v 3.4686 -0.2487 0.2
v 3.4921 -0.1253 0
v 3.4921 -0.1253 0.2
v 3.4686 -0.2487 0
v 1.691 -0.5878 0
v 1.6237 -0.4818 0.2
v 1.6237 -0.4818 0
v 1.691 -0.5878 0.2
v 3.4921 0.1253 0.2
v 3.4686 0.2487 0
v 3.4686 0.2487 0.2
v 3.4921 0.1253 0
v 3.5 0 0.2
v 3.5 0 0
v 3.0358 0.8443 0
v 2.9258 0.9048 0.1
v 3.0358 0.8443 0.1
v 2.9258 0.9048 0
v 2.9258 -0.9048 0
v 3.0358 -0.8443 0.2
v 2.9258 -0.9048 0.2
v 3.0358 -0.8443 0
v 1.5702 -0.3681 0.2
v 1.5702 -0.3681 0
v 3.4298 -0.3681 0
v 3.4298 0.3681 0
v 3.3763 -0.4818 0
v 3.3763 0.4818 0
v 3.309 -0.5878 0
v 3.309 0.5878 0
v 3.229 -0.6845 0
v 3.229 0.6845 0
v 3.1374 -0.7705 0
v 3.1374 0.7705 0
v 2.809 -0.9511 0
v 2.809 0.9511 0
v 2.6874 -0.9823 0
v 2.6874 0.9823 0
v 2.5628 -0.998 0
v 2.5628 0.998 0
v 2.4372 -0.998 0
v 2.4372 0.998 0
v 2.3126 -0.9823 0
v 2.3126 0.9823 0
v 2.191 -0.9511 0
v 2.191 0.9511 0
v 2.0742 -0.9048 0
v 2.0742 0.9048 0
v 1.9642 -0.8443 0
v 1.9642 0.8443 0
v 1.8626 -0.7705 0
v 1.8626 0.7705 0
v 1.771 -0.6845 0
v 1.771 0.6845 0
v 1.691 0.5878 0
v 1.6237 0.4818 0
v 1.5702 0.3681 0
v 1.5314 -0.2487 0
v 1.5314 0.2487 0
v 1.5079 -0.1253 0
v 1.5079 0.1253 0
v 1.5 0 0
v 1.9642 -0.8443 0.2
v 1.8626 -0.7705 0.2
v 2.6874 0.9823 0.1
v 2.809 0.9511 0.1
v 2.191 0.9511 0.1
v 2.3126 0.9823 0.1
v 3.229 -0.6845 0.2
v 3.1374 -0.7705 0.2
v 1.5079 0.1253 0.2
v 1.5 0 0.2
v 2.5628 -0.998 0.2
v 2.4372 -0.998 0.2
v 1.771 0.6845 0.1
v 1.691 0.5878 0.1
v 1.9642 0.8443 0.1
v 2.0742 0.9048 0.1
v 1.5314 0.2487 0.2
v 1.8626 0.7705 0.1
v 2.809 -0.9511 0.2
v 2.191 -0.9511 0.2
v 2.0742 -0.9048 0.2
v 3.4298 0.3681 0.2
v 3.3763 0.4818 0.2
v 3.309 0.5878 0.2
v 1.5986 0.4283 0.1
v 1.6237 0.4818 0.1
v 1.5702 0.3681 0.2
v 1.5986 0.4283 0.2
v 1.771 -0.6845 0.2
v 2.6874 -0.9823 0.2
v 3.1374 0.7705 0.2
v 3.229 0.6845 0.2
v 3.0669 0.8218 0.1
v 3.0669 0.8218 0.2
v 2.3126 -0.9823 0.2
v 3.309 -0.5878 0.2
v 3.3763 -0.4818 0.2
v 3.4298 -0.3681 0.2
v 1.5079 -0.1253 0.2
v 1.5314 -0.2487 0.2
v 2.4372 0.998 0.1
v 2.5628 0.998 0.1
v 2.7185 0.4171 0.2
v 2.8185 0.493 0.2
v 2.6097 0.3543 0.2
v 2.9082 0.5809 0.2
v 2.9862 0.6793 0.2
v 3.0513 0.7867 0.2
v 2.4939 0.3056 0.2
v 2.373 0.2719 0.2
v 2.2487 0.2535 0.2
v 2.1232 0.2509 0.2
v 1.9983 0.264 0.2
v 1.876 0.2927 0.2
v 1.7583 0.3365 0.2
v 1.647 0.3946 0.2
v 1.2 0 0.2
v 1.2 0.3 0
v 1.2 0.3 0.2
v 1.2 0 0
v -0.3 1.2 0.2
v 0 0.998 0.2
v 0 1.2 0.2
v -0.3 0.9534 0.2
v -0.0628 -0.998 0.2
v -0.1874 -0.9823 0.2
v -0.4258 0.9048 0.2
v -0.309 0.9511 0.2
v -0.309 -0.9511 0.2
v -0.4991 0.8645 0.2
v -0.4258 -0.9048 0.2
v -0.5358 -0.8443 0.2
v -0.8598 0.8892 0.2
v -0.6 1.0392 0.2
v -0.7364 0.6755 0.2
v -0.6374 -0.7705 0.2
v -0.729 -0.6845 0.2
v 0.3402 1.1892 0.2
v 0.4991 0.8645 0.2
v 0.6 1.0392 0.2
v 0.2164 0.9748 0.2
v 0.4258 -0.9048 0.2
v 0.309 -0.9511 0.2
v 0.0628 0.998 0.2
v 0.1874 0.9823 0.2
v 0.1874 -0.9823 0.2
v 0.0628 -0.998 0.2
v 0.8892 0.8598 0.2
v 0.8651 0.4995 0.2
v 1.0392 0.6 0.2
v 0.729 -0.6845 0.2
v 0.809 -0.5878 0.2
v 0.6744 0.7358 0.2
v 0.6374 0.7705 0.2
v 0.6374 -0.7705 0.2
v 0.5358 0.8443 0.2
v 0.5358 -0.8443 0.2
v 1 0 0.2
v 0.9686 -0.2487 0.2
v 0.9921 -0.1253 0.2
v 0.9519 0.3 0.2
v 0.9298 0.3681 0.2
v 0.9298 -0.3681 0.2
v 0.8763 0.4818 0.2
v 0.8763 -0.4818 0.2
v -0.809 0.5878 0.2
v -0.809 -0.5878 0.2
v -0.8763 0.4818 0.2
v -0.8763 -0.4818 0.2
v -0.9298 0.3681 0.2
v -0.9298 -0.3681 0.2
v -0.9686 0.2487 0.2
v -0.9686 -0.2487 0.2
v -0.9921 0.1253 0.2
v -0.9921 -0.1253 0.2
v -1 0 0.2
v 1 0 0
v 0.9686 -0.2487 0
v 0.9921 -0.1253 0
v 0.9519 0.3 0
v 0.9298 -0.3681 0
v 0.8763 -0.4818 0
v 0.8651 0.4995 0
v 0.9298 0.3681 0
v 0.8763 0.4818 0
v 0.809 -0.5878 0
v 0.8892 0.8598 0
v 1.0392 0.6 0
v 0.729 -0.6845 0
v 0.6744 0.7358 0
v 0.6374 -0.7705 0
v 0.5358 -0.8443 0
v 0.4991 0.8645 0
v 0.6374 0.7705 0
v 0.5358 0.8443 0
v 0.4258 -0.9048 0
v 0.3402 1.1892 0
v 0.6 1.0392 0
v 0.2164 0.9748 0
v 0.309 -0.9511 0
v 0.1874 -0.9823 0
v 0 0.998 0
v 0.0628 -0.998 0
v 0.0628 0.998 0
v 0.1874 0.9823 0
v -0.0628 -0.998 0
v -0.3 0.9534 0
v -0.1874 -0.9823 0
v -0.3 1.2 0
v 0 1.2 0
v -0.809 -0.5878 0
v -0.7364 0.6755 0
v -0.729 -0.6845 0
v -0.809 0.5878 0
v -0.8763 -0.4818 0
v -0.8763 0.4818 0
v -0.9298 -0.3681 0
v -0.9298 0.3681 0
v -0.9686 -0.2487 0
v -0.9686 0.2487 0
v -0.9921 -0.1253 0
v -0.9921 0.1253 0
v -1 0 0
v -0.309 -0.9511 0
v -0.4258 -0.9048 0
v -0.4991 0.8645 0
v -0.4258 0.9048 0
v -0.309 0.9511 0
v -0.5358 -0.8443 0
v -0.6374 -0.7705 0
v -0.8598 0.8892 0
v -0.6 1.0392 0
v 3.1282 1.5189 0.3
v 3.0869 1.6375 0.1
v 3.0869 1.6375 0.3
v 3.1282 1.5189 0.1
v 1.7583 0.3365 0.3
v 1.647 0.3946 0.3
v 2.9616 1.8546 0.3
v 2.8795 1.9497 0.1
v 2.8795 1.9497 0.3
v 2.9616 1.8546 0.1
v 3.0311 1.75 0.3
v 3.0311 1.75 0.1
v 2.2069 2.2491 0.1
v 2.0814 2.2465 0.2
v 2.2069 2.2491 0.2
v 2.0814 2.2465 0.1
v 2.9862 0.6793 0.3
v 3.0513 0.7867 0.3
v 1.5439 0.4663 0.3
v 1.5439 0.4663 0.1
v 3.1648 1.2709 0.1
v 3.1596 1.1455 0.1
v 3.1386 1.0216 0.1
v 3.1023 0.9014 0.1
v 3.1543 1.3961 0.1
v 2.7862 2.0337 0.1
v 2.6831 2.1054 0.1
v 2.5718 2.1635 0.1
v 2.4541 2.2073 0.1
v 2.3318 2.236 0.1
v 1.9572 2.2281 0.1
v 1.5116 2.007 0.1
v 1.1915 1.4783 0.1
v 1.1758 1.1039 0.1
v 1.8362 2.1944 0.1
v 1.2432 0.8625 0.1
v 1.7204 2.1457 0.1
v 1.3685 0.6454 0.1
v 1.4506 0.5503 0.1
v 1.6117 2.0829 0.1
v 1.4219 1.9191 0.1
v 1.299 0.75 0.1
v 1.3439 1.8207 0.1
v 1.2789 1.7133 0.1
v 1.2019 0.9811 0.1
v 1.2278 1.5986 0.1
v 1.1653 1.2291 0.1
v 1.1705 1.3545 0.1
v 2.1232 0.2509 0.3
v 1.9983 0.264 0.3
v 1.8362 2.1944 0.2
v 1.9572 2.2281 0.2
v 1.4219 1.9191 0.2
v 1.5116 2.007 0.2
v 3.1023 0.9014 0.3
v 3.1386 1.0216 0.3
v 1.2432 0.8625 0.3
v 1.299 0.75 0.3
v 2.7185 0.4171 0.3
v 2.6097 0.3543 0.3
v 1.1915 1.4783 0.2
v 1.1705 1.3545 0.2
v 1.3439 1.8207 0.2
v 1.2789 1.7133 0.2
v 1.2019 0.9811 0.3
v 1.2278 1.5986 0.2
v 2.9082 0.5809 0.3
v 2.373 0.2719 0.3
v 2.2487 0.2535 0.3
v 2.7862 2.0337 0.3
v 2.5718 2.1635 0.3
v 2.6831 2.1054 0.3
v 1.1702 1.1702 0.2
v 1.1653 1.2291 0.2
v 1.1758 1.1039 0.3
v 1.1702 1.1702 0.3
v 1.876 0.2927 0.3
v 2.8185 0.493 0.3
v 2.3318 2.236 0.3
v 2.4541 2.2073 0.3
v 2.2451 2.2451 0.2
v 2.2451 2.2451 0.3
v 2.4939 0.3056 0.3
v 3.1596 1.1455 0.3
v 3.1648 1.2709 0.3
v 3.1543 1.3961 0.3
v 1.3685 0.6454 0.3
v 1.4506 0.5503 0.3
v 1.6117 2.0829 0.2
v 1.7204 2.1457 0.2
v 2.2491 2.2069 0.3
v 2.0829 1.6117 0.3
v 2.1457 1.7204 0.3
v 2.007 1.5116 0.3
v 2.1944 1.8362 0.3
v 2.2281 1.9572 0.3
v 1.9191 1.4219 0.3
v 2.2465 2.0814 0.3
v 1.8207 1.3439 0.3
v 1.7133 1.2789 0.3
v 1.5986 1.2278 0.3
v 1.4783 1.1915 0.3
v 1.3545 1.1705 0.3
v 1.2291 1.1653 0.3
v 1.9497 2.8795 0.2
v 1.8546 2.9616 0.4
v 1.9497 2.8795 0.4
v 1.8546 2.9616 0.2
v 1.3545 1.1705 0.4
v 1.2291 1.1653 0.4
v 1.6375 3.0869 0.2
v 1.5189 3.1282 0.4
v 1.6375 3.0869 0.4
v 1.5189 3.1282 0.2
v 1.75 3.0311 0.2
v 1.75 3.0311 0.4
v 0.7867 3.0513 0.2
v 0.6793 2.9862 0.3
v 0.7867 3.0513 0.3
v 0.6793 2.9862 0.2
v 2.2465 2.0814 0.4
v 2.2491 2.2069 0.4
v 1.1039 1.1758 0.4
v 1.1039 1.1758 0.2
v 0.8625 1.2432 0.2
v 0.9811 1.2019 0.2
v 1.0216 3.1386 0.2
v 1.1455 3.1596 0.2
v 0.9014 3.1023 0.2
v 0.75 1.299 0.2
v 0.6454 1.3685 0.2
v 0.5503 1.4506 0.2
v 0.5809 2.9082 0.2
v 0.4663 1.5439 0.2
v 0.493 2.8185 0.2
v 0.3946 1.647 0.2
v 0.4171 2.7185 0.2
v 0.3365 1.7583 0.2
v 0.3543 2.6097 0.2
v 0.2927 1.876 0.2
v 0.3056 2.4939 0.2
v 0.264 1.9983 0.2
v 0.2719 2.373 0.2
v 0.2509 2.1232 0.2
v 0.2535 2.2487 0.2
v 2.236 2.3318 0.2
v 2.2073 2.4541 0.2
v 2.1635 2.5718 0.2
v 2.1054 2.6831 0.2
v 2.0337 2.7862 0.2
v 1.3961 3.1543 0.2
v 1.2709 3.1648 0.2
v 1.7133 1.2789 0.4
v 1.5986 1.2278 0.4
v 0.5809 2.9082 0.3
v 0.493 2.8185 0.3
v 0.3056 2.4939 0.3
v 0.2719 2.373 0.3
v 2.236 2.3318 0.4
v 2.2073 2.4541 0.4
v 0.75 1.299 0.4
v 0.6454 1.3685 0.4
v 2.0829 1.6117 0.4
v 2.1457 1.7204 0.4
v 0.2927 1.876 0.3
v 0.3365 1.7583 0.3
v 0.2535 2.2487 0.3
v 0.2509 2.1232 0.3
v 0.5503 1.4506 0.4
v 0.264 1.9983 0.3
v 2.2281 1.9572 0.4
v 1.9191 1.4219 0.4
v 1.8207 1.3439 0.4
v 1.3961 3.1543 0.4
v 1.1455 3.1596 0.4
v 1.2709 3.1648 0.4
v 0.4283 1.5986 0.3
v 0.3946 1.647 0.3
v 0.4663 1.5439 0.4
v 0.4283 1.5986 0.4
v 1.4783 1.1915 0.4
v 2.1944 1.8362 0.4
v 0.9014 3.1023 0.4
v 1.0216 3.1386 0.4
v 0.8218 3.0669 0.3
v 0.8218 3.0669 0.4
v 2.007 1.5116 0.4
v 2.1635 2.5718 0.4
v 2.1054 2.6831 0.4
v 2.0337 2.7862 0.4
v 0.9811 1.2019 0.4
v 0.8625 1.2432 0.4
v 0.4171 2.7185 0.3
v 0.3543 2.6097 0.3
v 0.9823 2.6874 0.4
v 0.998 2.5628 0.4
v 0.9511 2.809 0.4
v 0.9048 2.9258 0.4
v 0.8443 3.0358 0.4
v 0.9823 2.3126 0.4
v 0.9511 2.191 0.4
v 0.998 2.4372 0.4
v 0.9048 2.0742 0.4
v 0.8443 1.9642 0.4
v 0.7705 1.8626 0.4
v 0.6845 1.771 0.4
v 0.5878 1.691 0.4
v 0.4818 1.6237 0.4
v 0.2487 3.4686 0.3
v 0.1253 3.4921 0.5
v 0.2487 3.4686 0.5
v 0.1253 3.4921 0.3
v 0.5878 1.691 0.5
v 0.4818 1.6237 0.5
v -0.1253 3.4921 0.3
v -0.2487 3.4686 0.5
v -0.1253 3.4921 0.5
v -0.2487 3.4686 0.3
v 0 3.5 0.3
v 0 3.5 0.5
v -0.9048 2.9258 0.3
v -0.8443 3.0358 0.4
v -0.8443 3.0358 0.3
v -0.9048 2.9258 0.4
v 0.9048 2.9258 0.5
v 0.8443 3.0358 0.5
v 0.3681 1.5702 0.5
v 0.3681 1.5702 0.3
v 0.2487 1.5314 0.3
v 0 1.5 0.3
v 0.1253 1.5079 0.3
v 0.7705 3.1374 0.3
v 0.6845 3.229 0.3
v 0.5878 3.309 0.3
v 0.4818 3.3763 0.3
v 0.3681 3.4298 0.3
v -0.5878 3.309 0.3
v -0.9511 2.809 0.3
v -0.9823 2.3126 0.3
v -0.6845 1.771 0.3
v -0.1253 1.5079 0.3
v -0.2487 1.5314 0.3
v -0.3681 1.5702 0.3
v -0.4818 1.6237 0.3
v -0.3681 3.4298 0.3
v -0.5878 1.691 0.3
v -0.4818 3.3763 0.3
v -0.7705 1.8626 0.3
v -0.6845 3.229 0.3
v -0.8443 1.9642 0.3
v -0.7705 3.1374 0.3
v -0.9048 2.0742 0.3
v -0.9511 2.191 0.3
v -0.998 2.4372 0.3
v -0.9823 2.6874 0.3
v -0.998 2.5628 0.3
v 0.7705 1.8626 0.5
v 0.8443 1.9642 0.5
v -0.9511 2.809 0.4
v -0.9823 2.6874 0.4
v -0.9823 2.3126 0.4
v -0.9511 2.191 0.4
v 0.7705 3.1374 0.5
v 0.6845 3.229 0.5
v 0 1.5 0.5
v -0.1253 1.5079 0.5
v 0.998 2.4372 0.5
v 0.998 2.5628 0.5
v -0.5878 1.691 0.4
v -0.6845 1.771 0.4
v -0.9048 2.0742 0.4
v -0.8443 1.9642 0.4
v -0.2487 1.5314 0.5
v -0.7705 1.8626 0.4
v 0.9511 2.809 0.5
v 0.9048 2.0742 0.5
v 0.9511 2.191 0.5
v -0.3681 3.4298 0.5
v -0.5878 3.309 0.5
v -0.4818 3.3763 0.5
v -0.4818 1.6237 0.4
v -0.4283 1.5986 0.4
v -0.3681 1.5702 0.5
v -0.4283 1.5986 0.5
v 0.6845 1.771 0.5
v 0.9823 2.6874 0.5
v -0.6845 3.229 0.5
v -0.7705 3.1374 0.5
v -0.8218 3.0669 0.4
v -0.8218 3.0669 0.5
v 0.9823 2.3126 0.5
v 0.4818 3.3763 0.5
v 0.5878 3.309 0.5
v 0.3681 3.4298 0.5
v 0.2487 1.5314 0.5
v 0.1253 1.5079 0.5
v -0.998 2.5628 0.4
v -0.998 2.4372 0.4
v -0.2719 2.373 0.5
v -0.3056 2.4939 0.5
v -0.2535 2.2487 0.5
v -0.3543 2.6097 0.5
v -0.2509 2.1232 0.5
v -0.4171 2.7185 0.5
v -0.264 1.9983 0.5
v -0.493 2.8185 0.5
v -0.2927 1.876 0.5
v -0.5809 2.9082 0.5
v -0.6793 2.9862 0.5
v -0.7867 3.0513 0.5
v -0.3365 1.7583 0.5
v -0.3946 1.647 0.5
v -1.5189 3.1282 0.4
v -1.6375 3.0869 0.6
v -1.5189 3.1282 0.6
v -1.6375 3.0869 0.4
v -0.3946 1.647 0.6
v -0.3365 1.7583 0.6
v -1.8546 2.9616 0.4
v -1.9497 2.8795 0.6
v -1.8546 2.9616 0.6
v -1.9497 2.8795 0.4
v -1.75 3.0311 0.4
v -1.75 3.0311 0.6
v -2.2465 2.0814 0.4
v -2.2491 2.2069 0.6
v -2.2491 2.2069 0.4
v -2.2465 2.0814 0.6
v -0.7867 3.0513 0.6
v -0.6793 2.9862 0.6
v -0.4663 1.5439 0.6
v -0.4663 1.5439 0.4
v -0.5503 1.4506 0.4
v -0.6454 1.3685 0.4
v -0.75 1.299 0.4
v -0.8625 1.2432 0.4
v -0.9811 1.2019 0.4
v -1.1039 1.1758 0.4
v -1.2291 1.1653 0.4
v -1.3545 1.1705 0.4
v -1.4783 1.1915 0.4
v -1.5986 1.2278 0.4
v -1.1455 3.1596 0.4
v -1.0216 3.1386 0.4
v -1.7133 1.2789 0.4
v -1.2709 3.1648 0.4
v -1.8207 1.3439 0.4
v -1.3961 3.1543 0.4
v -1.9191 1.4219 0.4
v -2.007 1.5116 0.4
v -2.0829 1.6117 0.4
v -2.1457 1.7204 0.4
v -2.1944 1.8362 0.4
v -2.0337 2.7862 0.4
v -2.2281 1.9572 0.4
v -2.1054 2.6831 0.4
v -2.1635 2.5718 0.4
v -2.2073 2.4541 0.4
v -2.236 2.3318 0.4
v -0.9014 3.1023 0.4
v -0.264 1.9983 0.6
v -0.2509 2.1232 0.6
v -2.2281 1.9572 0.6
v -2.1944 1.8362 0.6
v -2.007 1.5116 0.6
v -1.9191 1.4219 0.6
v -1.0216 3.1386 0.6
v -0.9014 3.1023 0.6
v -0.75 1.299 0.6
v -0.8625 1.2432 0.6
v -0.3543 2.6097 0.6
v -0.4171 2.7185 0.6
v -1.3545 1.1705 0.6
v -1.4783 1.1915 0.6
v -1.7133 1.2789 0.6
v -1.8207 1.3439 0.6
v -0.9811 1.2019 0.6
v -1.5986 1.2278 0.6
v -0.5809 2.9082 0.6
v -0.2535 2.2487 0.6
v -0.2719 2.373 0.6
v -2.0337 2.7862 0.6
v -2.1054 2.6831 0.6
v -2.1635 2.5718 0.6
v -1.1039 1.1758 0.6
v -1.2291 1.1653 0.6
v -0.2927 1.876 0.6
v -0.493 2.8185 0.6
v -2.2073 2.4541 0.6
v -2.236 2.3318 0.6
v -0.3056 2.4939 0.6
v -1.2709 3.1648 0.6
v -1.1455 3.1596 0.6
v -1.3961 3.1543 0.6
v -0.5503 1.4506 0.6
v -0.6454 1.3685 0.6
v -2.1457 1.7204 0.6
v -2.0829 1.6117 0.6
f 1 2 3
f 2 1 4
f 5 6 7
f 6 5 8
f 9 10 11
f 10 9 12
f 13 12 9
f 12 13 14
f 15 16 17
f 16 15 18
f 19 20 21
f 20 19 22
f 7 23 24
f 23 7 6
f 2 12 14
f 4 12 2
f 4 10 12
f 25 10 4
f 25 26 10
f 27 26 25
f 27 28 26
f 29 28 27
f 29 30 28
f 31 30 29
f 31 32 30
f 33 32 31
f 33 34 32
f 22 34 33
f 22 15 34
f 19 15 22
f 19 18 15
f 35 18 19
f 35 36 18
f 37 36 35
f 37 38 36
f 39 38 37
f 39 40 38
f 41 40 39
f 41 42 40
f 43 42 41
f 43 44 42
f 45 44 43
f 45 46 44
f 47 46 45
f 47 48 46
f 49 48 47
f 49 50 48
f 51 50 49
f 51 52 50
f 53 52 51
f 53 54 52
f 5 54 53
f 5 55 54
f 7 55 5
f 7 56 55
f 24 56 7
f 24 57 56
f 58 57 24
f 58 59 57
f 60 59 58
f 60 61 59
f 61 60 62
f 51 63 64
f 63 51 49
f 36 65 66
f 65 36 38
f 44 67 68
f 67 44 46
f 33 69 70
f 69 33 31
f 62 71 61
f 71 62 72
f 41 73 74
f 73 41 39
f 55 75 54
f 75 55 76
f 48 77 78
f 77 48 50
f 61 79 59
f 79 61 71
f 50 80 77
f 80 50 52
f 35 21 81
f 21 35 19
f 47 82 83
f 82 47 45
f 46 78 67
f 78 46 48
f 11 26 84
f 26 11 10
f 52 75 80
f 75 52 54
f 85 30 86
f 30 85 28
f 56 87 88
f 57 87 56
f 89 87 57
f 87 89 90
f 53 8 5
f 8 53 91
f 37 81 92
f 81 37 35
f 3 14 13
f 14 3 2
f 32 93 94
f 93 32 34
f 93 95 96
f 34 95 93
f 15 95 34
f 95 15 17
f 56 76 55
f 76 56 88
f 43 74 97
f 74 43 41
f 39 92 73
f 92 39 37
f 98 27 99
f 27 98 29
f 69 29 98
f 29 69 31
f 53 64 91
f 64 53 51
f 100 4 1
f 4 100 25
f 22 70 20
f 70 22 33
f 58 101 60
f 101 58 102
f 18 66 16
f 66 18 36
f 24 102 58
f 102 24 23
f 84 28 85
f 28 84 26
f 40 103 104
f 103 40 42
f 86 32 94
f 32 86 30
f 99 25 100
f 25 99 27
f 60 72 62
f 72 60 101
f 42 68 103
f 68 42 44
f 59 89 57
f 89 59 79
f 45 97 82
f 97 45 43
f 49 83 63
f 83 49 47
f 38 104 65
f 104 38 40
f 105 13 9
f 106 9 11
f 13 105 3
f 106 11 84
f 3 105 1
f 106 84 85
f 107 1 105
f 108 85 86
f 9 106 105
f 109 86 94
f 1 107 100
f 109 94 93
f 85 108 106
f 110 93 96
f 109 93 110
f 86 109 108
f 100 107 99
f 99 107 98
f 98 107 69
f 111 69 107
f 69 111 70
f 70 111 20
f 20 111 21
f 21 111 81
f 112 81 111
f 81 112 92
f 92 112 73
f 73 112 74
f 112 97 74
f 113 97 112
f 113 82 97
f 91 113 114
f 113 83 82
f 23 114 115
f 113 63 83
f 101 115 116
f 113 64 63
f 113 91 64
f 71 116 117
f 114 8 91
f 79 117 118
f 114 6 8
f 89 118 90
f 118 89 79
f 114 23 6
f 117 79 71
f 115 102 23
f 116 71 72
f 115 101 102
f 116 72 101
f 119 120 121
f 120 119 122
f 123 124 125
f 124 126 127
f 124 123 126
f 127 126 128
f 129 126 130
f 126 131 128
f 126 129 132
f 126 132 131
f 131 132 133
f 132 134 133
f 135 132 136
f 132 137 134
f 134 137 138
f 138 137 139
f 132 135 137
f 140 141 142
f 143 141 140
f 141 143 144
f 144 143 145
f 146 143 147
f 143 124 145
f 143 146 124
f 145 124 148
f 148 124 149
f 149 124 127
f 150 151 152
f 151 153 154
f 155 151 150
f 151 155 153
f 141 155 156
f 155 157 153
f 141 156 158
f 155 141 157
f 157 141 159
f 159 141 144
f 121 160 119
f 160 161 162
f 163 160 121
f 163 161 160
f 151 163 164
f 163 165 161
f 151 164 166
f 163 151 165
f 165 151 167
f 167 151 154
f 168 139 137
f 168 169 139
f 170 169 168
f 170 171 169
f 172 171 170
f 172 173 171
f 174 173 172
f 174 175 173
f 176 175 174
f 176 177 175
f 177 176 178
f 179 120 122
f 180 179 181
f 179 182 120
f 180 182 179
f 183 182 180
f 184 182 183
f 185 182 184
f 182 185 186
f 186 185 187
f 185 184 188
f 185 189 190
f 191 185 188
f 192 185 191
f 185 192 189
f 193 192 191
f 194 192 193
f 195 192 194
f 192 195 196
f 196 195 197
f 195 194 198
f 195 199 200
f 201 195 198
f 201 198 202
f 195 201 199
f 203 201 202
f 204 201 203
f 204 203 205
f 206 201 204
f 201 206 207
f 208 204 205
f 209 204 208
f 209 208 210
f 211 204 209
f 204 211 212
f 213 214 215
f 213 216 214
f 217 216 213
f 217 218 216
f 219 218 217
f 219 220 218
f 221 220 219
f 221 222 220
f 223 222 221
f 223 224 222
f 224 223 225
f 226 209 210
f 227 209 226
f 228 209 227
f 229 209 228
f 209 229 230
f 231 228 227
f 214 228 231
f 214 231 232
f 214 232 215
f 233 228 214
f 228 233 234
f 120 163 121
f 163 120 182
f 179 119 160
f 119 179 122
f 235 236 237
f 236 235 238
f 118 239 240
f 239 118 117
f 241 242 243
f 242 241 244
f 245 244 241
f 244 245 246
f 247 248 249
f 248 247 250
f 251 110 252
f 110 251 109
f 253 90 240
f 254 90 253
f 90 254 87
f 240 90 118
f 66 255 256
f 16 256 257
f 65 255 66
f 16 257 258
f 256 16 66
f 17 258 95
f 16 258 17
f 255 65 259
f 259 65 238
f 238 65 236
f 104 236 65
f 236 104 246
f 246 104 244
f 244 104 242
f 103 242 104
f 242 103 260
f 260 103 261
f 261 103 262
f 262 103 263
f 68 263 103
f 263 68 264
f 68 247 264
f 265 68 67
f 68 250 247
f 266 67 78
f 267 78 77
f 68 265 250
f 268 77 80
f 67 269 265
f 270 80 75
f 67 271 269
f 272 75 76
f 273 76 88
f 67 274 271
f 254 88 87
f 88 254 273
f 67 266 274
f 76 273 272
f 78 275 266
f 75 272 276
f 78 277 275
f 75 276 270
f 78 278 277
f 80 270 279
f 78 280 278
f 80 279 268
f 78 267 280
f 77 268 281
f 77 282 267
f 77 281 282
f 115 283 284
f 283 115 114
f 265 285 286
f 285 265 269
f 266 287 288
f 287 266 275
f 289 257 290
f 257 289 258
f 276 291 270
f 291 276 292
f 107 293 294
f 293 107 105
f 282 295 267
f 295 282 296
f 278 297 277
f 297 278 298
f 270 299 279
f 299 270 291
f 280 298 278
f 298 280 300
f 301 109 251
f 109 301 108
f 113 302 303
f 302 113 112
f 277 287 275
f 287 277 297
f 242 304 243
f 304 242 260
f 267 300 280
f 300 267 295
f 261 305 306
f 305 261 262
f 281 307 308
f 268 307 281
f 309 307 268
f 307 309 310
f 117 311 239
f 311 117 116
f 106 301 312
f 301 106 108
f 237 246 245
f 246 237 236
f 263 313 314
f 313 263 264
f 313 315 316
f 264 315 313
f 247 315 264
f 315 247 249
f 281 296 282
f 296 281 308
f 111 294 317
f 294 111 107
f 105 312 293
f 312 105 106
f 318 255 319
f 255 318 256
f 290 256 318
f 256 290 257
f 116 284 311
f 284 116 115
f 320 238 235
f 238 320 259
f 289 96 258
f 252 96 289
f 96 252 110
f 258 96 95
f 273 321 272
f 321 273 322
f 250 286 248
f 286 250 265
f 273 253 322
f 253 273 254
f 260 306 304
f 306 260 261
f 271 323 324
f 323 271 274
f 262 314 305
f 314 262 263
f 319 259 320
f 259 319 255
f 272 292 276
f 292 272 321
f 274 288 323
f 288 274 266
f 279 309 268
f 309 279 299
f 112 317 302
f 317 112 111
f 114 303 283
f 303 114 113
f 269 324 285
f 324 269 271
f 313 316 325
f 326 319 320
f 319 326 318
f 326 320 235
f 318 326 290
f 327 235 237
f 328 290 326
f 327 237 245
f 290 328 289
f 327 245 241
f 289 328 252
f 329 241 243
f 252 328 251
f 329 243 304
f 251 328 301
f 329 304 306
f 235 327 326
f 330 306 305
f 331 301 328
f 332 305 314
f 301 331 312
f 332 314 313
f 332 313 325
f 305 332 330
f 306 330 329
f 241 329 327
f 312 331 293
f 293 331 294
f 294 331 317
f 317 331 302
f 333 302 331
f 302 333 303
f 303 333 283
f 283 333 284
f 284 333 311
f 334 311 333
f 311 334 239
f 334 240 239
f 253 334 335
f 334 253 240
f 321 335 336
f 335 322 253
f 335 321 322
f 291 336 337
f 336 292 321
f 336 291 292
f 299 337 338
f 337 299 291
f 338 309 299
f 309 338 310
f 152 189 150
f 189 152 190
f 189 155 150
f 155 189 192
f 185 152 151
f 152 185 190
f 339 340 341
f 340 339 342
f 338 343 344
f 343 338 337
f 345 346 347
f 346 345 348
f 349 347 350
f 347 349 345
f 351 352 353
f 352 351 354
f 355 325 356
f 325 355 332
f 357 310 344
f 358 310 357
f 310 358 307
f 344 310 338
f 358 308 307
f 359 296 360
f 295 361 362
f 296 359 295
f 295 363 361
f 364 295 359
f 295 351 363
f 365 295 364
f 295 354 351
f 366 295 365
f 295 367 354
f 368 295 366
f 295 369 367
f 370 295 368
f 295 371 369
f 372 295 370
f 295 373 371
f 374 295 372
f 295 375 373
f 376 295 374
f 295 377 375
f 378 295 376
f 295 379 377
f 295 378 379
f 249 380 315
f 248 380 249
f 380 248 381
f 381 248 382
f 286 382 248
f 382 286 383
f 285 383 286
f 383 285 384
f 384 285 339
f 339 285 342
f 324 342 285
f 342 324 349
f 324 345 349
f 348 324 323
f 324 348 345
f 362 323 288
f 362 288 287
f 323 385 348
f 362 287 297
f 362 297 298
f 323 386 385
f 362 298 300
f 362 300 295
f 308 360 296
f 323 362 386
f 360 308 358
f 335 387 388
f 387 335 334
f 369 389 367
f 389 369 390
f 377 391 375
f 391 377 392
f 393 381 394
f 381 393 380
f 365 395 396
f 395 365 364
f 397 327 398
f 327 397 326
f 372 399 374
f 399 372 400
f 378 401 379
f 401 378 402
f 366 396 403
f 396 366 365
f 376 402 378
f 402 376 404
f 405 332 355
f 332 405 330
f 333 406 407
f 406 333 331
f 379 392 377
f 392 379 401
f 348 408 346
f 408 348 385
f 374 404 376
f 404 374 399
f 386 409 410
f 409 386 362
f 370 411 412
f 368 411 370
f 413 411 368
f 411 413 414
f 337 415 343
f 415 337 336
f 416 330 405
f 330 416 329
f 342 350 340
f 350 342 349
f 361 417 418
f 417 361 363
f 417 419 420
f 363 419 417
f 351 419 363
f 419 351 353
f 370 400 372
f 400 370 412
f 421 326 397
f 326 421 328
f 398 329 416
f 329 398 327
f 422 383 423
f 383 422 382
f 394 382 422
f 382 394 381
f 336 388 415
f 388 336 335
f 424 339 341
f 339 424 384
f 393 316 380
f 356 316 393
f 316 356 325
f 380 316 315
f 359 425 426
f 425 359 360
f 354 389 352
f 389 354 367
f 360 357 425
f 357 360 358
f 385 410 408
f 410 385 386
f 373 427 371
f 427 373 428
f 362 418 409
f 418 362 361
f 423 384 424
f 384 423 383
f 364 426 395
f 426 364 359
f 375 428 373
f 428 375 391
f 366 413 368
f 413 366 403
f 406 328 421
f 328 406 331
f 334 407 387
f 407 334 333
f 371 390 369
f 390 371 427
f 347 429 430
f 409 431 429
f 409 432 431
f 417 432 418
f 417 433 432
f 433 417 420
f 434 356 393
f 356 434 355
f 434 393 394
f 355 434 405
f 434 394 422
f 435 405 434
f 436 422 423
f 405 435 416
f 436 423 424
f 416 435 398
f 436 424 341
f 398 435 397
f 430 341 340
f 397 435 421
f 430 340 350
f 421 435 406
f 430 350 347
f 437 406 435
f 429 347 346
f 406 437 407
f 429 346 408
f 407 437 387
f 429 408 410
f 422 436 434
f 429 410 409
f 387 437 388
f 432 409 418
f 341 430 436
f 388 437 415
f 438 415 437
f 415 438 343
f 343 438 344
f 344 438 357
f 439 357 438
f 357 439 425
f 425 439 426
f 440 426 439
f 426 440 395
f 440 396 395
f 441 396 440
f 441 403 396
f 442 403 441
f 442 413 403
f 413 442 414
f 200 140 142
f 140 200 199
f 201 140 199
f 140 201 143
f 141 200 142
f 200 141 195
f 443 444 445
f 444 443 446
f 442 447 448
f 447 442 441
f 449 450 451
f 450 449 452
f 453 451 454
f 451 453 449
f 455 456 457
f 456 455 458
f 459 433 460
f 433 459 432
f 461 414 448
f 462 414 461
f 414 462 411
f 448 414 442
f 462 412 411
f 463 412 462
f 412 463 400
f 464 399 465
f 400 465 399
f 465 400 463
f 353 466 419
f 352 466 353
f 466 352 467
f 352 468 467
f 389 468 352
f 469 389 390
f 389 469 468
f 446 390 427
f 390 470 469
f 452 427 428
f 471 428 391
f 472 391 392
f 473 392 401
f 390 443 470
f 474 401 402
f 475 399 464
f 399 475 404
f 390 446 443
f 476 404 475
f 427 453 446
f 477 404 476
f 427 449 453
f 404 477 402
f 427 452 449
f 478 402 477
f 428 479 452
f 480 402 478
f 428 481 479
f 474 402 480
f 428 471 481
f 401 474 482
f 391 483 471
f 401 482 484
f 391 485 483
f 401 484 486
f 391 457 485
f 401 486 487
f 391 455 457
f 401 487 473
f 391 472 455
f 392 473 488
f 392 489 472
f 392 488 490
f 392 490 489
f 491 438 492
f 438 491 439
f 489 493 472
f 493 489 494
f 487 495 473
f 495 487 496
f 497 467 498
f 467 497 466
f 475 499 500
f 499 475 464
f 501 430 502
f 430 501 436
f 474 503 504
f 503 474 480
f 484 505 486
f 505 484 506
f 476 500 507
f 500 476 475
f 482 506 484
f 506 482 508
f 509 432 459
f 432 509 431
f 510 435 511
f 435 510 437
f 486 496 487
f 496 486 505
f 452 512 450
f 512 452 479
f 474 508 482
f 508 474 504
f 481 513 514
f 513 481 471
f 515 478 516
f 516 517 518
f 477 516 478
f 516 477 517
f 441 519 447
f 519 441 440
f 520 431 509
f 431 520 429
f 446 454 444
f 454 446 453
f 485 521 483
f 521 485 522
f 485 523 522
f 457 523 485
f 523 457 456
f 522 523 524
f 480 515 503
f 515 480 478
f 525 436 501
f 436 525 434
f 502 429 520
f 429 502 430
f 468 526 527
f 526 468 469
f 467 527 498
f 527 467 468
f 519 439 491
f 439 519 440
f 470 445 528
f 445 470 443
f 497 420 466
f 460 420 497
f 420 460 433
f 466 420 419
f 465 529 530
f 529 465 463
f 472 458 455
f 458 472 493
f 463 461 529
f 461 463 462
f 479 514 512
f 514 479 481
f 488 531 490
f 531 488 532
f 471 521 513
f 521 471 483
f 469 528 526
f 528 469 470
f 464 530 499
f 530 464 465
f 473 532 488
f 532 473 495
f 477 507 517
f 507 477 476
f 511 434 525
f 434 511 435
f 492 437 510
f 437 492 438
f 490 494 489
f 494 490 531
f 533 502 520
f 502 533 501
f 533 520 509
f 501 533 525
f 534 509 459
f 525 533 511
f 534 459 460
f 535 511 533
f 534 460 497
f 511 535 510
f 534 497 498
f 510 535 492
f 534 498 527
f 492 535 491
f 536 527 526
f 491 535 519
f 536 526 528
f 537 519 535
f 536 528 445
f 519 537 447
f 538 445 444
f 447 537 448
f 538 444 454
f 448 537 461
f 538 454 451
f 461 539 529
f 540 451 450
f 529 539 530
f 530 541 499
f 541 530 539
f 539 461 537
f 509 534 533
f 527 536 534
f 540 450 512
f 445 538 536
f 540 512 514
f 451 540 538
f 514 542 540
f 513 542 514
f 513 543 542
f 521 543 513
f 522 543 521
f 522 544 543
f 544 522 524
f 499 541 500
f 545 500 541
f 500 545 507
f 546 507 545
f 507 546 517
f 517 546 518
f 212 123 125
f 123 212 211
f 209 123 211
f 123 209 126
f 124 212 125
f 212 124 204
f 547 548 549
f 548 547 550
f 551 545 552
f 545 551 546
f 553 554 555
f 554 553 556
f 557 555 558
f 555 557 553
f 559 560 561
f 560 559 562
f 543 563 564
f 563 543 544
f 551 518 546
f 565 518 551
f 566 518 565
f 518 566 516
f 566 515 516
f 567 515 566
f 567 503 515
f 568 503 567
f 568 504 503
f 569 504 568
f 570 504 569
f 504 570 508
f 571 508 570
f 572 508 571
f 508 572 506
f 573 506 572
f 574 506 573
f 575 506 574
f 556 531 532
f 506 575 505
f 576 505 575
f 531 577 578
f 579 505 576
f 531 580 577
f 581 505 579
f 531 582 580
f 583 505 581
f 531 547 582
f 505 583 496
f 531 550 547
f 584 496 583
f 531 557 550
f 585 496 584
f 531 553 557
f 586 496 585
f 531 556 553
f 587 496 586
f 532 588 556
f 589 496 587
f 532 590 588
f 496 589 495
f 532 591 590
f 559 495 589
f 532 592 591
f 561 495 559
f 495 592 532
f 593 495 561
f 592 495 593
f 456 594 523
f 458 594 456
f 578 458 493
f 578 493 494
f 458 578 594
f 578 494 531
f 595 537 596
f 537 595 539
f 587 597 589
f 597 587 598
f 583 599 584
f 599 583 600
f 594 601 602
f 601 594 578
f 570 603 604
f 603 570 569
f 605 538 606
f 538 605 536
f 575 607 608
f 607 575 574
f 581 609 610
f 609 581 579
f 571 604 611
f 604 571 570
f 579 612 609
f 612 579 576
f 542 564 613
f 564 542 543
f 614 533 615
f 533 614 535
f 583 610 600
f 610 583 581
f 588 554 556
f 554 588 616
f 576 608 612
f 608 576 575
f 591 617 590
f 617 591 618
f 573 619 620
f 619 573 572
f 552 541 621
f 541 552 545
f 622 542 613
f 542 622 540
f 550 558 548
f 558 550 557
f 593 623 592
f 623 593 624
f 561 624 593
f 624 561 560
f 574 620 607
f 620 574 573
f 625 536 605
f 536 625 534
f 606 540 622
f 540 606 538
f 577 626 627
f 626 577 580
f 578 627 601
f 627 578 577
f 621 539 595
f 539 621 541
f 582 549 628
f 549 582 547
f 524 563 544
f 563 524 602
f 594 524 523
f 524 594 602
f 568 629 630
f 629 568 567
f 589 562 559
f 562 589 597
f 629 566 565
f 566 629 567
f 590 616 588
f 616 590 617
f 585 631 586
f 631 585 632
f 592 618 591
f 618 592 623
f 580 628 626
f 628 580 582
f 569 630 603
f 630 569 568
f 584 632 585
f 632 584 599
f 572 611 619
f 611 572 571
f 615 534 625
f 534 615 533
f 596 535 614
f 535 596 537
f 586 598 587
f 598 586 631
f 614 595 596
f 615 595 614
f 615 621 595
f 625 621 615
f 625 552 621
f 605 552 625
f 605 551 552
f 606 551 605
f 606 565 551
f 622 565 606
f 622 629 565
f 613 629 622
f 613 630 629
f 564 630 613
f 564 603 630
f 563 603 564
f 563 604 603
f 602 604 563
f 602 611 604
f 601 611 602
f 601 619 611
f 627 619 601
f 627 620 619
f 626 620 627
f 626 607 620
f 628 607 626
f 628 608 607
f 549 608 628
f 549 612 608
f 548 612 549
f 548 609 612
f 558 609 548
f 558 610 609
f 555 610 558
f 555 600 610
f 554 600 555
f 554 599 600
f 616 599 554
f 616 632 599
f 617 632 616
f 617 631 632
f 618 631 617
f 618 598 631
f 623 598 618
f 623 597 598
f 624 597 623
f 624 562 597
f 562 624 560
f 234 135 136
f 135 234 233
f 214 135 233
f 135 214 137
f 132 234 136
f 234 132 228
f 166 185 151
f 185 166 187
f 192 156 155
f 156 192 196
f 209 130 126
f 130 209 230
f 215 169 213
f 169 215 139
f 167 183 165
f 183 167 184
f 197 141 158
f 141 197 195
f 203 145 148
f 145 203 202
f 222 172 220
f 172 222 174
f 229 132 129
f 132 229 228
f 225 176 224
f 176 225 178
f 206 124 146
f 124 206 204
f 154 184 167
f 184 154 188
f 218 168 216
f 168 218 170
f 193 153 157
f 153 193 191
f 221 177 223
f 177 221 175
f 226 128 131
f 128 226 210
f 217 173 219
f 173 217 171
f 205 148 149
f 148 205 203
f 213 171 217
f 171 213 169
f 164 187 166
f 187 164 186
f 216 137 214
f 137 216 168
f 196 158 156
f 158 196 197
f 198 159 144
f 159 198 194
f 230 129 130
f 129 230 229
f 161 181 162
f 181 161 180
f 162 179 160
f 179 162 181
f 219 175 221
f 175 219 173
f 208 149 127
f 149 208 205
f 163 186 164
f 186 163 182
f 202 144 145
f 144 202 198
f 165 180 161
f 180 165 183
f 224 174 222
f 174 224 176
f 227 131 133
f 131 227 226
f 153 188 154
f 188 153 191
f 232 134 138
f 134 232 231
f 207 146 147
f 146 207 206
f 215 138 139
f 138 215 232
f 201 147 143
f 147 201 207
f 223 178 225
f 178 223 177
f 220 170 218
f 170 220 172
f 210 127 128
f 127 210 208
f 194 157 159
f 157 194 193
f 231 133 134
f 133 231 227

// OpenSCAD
// Generated by SolidPython 1.1.1 on 2021-11-15 13:51:24
$fn = 50;


union() {
	cylinder(h = 0.2000000000, r = 1);
	rotate(a = [0, 0, 0]) {
		union() {
			translate(v = [2.5000000000, 0, 0]) {
				cylinder(h = 0.2000000000, r = 1);
			}
			translate(v = [0.4000000000, 0, 0]) {
				cube(size = [0.8000000000, 0.3000000000, 0.2000000000]);
			}
		}
	}
	rotate(a = [0, 0, 30]) {
		union() {
			translate(v = [2.5000000000, 0, 0.1000000000]) {
				cylinder(h = 0.2000000000, r = 1);
			}
			translate(v = [0.4000000000, 0, 0]) {
				cube(size = [0.8000000000, 0.3000000000, 0.2000000000]);
			}
		}
	}
	rotate(a = [0, 0, 60]) {
		union() {
			translate(v = [2.5000000000, 0, 0.2000000000]) {
				cylinder(h = 0.2000000000, r = 1);
			}
			translate(v = [0.4000000000, 0, 0]) {
				cube(size = [0.8000000000, 0.3000000000, 0.2000000000]);
			}
		}
	}
	rotate(a = [0, 0, 90]) {
		union() {
			translate(v = [2.5000000000, 0, 0.3000000000]) {
				cylinder(h = 0.2000000000, r = 1);
			}
			translate(v = [0.4000000000, 0, 0]) {
				cube(size = [0.8000000000, 0.3000000000, 0.2000000000]);
			}
		}
	}
	rotate(a = [0, 0, 120]) {
		union() {
			translate(v = [2.5000000000, 0, 0.4000000000]) {
				cylinder(h = 0.2000000000, r = 1);
			}
			translate(v = [0.4000000000, 0, 0]) {
				cube(size = [0.8000000000, 0.3000000000, 0.2000000000]);
			}
		}
	}
}
/***********************************************
*********      SolidPython code:      **********
************************************************
 
# SolidPython example code 
# Brygg Ullmer, Clemson University
# Written 2021-10-28

from solid import *        # load in SolidPython/SCAD support code

outGeom = c1 = cylinder(r=1, h=.2)
count = 5; rot  = 0; rotIncr = 30
z = 0; dz = .1

s1 = cube([.8,.3,.2]) # s for feather "stem"
s2 = translate([.4,0,0])(s1)

for i in range(count):
  c2 = translate([2.5,0,z])(c1) + s2
  c3 = rotate([0,0,rot])(c2)
  outGeom += c3; rot += rotIncr; z += dz

radialSegments = 50; hdr = '$fn = %s;' % radialSegments # create a header for the export
scad_render_to_file(outGeom, 'exTg04.scad', file_header=hdr) # write the .scad file

### end ###

 
 
************************************************/
